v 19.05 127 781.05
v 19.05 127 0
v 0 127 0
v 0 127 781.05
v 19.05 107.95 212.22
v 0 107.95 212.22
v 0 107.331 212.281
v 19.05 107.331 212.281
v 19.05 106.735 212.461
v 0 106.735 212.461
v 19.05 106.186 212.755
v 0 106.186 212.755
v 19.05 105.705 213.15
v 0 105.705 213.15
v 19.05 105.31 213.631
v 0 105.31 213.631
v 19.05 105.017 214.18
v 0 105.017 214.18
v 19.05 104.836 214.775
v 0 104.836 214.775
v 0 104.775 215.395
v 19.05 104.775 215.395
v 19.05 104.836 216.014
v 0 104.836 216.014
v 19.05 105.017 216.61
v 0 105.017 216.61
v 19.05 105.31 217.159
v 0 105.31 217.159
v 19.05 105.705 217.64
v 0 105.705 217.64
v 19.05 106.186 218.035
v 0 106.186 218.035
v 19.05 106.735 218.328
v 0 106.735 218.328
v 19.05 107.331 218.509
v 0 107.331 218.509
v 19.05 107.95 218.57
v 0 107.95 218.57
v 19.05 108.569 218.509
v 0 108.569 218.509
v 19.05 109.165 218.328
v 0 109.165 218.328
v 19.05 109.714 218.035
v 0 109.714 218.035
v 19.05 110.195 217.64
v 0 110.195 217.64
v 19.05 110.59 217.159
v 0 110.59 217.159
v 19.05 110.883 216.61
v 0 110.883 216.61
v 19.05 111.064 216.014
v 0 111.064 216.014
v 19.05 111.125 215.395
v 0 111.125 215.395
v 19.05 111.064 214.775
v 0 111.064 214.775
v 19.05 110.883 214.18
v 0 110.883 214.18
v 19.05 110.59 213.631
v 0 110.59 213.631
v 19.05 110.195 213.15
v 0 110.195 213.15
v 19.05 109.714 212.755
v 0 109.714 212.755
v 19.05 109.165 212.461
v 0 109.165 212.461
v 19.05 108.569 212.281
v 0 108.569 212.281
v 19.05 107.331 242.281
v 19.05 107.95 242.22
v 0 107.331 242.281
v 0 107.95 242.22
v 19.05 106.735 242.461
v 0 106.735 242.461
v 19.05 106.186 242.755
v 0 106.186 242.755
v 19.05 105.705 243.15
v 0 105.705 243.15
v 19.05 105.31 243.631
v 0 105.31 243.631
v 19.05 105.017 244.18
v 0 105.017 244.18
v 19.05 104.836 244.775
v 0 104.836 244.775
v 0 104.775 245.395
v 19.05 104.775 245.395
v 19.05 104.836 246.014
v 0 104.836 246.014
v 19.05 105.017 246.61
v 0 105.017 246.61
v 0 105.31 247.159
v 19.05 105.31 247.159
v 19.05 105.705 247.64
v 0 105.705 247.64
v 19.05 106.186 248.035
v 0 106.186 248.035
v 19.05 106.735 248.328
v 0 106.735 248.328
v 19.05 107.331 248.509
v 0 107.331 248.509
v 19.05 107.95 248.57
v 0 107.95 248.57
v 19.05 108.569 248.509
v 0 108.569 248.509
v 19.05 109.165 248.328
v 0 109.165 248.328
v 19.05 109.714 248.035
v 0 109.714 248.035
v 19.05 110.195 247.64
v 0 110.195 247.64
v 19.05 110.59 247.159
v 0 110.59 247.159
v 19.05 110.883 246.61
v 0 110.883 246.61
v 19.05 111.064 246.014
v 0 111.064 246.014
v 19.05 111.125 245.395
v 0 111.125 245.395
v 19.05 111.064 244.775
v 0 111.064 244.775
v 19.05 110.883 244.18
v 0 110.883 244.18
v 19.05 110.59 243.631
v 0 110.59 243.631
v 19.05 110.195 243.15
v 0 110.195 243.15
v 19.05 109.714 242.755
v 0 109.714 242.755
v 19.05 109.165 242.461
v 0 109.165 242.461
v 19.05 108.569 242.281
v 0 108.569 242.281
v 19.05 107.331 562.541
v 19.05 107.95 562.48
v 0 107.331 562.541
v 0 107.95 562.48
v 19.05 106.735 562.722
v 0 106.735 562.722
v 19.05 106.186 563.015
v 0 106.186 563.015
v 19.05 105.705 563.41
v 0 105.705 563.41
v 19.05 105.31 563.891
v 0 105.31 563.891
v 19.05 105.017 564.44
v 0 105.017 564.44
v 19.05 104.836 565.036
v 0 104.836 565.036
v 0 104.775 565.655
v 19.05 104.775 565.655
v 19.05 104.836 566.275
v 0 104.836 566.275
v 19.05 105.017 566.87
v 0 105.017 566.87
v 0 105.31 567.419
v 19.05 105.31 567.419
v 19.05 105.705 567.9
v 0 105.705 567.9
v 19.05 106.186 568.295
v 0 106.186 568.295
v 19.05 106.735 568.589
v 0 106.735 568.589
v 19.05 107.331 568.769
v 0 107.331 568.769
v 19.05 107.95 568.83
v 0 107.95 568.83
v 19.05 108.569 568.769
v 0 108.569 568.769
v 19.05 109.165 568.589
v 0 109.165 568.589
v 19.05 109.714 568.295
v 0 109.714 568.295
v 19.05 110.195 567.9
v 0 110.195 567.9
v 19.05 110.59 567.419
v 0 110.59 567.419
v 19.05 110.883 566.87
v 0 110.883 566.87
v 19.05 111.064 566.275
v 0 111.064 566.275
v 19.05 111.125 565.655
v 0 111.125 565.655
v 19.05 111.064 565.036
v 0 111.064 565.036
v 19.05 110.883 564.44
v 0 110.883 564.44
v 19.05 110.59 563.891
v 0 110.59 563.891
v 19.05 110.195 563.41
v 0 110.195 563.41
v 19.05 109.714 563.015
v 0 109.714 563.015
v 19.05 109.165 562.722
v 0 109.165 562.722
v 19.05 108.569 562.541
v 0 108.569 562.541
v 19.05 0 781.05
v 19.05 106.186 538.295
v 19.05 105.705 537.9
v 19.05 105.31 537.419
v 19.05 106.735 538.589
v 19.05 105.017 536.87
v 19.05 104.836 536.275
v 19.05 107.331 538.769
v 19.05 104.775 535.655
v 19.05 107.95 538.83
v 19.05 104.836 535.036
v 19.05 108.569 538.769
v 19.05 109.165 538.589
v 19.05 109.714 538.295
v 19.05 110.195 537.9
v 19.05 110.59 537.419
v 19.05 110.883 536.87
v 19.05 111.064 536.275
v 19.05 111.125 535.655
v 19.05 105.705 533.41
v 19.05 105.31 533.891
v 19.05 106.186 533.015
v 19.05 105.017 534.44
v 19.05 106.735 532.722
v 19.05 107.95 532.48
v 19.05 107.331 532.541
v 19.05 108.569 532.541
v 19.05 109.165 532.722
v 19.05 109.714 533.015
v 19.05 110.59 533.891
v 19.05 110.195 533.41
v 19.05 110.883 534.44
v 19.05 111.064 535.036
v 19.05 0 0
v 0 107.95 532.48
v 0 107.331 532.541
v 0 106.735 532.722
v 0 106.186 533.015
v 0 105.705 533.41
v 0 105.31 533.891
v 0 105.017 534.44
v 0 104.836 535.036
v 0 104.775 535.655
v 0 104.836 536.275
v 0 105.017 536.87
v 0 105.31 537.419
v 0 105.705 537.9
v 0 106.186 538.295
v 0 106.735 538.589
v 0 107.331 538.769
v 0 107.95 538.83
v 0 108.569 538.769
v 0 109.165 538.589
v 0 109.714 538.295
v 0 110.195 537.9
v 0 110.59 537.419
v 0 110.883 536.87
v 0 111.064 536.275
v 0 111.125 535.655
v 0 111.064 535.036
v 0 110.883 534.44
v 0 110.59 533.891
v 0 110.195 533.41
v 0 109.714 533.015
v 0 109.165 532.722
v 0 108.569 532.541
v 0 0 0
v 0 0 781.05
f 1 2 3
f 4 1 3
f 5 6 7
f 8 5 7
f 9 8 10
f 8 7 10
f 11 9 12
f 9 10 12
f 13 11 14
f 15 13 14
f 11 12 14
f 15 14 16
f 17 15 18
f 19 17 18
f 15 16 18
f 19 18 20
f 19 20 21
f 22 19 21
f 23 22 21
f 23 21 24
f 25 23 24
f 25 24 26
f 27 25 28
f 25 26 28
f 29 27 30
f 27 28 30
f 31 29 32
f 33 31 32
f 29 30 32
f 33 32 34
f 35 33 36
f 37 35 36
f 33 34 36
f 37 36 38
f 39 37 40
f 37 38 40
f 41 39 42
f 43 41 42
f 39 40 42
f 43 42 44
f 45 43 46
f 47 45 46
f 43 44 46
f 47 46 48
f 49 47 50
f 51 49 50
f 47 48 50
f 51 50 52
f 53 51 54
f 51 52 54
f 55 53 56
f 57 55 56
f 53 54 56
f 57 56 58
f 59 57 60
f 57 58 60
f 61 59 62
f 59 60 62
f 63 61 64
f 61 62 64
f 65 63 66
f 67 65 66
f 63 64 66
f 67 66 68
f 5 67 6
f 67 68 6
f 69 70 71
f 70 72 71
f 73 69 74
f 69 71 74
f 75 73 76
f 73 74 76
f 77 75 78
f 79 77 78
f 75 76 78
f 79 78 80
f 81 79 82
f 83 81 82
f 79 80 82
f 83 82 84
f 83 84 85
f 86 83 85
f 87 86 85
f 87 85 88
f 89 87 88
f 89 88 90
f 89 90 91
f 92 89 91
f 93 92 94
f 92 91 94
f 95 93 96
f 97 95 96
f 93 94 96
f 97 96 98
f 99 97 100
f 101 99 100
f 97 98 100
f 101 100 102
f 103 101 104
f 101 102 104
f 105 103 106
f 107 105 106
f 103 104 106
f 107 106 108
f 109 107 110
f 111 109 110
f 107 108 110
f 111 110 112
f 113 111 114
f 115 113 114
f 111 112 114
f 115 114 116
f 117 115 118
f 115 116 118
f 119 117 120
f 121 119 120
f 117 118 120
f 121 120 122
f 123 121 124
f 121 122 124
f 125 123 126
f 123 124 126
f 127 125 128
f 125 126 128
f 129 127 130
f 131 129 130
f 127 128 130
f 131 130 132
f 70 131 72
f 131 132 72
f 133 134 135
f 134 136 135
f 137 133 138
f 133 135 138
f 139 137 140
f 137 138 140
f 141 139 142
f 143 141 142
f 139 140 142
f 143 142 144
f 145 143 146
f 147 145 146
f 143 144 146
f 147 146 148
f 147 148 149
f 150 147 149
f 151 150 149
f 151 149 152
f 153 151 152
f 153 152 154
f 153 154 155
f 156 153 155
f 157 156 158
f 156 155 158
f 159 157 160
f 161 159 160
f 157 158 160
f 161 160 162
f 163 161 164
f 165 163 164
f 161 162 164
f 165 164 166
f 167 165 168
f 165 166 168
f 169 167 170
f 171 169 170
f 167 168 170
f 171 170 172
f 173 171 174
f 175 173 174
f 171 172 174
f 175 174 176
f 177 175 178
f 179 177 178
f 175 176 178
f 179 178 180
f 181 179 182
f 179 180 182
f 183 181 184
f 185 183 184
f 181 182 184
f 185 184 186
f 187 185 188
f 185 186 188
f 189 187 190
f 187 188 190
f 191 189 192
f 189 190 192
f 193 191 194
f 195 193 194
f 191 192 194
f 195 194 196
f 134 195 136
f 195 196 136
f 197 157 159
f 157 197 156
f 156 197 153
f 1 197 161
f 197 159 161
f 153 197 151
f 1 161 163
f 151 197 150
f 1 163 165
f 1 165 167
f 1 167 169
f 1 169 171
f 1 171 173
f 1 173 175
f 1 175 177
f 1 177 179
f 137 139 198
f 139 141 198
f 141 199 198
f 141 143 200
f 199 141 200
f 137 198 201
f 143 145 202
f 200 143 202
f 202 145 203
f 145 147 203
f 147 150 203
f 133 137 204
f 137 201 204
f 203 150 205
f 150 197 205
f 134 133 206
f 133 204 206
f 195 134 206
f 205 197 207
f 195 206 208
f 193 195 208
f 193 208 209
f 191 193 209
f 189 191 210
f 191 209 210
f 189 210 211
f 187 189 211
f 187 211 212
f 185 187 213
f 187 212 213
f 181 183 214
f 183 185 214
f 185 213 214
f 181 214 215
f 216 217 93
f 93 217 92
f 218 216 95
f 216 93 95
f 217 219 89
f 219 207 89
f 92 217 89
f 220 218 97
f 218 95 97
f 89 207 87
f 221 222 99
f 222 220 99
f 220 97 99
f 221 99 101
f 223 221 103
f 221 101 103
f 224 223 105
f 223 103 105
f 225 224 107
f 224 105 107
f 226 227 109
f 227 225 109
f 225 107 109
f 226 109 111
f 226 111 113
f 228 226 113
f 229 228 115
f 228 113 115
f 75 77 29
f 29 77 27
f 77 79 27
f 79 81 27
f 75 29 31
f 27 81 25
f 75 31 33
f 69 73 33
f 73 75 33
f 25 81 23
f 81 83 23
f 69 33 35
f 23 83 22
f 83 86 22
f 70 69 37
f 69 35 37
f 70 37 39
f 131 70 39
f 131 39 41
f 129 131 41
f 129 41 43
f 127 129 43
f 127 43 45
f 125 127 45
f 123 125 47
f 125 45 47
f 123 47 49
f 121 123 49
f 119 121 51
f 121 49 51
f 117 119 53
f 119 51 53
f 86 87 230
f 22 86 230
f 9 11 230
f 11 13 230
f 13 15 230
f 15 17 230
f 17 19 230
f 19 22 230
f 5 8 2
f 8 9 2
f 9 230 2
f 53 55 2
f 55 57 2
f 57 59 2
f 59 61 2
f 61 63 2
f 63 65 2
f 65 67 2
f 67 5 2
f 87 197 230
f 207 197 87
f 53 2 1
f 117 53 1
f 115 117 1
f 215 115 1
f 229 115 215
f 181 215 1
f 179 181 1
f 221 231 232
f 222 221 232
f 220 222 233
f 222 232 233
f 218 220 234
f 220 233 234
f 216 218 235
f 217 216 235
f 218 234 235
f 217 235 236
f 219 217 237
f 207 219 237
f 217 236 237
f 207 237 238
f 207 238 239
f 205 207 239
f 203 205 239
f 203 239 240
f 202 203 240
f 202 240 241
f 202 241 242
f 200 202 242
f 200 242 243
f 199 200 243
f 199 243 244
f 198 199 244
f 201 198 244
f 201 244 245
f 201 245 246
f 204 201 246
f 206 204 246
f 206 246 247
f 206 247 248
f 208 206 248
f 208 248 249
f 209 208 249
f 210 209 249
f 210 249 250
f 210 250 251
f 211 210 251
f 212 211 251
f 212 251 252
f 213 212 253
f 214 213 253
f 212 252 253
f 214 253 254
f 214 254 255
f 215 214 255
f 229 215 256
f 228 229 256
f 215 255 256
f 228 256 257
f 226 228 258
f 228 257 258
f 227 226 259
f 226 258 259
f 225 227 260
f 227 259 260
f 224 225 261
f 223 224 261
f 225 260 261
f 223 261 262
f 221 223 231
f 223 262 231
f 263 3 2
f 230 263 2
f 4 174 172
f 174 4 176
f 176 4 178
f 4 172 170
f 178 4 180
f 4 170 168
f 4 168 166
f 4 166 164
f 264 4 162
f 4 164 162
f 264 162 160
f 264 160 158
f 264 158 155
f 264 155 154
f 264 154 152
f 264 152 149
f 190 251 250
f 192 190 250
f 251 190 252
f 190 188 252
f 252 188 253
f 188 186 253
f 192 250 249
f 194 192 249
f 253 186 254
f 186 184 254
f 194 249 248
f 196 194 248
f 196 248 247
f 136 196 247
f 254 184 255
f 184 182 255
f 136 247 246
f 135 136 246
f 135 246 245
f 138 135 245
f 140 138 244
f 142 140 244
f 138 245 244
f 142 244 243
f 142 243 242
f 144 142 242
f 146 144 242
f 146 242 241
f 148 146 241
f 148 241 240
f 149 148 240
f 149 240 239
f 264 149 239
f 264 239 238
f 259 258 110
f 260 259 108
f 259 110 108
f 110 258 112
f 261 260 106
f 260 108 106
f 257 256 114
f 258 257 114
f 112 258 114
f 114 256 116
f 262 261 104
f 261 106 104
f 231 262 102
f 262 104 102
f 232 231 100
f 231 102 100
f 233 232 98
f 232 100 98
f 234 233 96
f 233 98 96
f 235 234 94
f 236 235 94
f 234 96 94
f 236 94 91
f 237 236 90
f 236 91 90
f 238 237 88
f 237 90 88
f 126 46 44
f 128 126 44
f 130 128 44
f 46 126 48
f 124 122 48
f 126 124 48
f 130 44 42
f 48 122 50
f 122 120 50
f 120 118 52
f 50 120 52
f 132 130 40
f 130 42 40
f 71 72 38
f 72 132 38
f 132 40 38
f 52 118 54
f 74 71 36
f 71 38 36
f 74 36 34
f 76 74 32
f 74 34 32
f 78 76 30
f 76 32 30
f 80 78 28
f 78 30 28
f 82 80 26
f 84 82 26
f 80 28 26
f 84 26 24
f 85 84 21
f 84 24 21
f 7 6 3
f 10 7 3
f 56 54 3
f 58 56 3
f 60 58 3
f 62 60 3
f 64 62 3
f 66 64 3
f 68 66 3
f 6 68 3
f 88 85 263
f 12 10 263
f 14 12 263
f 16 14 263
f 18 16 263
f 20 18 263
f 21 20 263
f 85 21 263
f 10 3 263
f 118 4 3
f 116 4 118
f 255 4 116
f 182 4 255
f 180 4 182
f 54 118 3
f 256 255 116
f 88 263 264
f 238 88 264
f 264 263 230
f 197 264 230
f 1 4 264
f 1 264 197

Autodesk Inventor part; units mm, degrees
ref_plane "YZ Plane" through (0, 0, 0) normal (1, 0, 0) x (0, 1, 0)
ref_plane "XZ Plane" through (0, 0, 0) normal (0, 1, 0) x (-1, 0, 0)
ref_plane "XY Plane" through (0, 0, 0) normal (0, 0, 1) x (1, 0, 0)
sketch "Sketch1" plane through (0, 0, 0) normal (0, 0, 1) x (1, 0, 0)
  line L0 (0, 0) -> (19.05, 0)
  line L1 (19.05, 0) -> (19.05, 127)
  line L2 (19.05, 127) -> (0, 127)
  line L3 (0, 127) -> (0, 0)
  dimension "d0" = 19.05
  dimension "d1" = 127
extrude "Extrusion1" add sketch "Sketch1" along normal blind 781.05
sketch "Sketch2" plane through (19.05, 0, 0) normal (1, 0, 0) x (0, 0, -1)
  line L0 (0, 0) -> (0, 127) projected
  line L1 (0, 127) -> (-781.05, 127) projected
  line L2 (-781.05, 0) -> (-781.05, 127) projected
  line L3 (0, 0) -> (-781.05, 0) projected
  line L4 (-781.05, 107.95) -> (0, 107.95) construction
  point P0 (-565.6552, 107.95)
  point P1 (-535.6552, 107.95)
  point P2 (-215.3948, 107.95)
  point P3 (-245.3948, 107.95)
  dimension "d4" = 19.05
  dimension "d5" = 215.3948
  dimension "d6" = 30
  dimension "d7" = 30
  dimension "d8" = 215.3948
hole "Hole1" at (19.05, 107.95, 565.6552) at (19.05, 107.95, 535.6552) at (19.05, 107.95, 215.3948) at (19.05, 107.95, 245.3948) direction (-1, 0, 0) diameter 6.35 end through all
equation "\"d7\" = d6"
equation "\"d8\" = d5"
properties part number "Bumper Wood Side" material "Oak, White"
